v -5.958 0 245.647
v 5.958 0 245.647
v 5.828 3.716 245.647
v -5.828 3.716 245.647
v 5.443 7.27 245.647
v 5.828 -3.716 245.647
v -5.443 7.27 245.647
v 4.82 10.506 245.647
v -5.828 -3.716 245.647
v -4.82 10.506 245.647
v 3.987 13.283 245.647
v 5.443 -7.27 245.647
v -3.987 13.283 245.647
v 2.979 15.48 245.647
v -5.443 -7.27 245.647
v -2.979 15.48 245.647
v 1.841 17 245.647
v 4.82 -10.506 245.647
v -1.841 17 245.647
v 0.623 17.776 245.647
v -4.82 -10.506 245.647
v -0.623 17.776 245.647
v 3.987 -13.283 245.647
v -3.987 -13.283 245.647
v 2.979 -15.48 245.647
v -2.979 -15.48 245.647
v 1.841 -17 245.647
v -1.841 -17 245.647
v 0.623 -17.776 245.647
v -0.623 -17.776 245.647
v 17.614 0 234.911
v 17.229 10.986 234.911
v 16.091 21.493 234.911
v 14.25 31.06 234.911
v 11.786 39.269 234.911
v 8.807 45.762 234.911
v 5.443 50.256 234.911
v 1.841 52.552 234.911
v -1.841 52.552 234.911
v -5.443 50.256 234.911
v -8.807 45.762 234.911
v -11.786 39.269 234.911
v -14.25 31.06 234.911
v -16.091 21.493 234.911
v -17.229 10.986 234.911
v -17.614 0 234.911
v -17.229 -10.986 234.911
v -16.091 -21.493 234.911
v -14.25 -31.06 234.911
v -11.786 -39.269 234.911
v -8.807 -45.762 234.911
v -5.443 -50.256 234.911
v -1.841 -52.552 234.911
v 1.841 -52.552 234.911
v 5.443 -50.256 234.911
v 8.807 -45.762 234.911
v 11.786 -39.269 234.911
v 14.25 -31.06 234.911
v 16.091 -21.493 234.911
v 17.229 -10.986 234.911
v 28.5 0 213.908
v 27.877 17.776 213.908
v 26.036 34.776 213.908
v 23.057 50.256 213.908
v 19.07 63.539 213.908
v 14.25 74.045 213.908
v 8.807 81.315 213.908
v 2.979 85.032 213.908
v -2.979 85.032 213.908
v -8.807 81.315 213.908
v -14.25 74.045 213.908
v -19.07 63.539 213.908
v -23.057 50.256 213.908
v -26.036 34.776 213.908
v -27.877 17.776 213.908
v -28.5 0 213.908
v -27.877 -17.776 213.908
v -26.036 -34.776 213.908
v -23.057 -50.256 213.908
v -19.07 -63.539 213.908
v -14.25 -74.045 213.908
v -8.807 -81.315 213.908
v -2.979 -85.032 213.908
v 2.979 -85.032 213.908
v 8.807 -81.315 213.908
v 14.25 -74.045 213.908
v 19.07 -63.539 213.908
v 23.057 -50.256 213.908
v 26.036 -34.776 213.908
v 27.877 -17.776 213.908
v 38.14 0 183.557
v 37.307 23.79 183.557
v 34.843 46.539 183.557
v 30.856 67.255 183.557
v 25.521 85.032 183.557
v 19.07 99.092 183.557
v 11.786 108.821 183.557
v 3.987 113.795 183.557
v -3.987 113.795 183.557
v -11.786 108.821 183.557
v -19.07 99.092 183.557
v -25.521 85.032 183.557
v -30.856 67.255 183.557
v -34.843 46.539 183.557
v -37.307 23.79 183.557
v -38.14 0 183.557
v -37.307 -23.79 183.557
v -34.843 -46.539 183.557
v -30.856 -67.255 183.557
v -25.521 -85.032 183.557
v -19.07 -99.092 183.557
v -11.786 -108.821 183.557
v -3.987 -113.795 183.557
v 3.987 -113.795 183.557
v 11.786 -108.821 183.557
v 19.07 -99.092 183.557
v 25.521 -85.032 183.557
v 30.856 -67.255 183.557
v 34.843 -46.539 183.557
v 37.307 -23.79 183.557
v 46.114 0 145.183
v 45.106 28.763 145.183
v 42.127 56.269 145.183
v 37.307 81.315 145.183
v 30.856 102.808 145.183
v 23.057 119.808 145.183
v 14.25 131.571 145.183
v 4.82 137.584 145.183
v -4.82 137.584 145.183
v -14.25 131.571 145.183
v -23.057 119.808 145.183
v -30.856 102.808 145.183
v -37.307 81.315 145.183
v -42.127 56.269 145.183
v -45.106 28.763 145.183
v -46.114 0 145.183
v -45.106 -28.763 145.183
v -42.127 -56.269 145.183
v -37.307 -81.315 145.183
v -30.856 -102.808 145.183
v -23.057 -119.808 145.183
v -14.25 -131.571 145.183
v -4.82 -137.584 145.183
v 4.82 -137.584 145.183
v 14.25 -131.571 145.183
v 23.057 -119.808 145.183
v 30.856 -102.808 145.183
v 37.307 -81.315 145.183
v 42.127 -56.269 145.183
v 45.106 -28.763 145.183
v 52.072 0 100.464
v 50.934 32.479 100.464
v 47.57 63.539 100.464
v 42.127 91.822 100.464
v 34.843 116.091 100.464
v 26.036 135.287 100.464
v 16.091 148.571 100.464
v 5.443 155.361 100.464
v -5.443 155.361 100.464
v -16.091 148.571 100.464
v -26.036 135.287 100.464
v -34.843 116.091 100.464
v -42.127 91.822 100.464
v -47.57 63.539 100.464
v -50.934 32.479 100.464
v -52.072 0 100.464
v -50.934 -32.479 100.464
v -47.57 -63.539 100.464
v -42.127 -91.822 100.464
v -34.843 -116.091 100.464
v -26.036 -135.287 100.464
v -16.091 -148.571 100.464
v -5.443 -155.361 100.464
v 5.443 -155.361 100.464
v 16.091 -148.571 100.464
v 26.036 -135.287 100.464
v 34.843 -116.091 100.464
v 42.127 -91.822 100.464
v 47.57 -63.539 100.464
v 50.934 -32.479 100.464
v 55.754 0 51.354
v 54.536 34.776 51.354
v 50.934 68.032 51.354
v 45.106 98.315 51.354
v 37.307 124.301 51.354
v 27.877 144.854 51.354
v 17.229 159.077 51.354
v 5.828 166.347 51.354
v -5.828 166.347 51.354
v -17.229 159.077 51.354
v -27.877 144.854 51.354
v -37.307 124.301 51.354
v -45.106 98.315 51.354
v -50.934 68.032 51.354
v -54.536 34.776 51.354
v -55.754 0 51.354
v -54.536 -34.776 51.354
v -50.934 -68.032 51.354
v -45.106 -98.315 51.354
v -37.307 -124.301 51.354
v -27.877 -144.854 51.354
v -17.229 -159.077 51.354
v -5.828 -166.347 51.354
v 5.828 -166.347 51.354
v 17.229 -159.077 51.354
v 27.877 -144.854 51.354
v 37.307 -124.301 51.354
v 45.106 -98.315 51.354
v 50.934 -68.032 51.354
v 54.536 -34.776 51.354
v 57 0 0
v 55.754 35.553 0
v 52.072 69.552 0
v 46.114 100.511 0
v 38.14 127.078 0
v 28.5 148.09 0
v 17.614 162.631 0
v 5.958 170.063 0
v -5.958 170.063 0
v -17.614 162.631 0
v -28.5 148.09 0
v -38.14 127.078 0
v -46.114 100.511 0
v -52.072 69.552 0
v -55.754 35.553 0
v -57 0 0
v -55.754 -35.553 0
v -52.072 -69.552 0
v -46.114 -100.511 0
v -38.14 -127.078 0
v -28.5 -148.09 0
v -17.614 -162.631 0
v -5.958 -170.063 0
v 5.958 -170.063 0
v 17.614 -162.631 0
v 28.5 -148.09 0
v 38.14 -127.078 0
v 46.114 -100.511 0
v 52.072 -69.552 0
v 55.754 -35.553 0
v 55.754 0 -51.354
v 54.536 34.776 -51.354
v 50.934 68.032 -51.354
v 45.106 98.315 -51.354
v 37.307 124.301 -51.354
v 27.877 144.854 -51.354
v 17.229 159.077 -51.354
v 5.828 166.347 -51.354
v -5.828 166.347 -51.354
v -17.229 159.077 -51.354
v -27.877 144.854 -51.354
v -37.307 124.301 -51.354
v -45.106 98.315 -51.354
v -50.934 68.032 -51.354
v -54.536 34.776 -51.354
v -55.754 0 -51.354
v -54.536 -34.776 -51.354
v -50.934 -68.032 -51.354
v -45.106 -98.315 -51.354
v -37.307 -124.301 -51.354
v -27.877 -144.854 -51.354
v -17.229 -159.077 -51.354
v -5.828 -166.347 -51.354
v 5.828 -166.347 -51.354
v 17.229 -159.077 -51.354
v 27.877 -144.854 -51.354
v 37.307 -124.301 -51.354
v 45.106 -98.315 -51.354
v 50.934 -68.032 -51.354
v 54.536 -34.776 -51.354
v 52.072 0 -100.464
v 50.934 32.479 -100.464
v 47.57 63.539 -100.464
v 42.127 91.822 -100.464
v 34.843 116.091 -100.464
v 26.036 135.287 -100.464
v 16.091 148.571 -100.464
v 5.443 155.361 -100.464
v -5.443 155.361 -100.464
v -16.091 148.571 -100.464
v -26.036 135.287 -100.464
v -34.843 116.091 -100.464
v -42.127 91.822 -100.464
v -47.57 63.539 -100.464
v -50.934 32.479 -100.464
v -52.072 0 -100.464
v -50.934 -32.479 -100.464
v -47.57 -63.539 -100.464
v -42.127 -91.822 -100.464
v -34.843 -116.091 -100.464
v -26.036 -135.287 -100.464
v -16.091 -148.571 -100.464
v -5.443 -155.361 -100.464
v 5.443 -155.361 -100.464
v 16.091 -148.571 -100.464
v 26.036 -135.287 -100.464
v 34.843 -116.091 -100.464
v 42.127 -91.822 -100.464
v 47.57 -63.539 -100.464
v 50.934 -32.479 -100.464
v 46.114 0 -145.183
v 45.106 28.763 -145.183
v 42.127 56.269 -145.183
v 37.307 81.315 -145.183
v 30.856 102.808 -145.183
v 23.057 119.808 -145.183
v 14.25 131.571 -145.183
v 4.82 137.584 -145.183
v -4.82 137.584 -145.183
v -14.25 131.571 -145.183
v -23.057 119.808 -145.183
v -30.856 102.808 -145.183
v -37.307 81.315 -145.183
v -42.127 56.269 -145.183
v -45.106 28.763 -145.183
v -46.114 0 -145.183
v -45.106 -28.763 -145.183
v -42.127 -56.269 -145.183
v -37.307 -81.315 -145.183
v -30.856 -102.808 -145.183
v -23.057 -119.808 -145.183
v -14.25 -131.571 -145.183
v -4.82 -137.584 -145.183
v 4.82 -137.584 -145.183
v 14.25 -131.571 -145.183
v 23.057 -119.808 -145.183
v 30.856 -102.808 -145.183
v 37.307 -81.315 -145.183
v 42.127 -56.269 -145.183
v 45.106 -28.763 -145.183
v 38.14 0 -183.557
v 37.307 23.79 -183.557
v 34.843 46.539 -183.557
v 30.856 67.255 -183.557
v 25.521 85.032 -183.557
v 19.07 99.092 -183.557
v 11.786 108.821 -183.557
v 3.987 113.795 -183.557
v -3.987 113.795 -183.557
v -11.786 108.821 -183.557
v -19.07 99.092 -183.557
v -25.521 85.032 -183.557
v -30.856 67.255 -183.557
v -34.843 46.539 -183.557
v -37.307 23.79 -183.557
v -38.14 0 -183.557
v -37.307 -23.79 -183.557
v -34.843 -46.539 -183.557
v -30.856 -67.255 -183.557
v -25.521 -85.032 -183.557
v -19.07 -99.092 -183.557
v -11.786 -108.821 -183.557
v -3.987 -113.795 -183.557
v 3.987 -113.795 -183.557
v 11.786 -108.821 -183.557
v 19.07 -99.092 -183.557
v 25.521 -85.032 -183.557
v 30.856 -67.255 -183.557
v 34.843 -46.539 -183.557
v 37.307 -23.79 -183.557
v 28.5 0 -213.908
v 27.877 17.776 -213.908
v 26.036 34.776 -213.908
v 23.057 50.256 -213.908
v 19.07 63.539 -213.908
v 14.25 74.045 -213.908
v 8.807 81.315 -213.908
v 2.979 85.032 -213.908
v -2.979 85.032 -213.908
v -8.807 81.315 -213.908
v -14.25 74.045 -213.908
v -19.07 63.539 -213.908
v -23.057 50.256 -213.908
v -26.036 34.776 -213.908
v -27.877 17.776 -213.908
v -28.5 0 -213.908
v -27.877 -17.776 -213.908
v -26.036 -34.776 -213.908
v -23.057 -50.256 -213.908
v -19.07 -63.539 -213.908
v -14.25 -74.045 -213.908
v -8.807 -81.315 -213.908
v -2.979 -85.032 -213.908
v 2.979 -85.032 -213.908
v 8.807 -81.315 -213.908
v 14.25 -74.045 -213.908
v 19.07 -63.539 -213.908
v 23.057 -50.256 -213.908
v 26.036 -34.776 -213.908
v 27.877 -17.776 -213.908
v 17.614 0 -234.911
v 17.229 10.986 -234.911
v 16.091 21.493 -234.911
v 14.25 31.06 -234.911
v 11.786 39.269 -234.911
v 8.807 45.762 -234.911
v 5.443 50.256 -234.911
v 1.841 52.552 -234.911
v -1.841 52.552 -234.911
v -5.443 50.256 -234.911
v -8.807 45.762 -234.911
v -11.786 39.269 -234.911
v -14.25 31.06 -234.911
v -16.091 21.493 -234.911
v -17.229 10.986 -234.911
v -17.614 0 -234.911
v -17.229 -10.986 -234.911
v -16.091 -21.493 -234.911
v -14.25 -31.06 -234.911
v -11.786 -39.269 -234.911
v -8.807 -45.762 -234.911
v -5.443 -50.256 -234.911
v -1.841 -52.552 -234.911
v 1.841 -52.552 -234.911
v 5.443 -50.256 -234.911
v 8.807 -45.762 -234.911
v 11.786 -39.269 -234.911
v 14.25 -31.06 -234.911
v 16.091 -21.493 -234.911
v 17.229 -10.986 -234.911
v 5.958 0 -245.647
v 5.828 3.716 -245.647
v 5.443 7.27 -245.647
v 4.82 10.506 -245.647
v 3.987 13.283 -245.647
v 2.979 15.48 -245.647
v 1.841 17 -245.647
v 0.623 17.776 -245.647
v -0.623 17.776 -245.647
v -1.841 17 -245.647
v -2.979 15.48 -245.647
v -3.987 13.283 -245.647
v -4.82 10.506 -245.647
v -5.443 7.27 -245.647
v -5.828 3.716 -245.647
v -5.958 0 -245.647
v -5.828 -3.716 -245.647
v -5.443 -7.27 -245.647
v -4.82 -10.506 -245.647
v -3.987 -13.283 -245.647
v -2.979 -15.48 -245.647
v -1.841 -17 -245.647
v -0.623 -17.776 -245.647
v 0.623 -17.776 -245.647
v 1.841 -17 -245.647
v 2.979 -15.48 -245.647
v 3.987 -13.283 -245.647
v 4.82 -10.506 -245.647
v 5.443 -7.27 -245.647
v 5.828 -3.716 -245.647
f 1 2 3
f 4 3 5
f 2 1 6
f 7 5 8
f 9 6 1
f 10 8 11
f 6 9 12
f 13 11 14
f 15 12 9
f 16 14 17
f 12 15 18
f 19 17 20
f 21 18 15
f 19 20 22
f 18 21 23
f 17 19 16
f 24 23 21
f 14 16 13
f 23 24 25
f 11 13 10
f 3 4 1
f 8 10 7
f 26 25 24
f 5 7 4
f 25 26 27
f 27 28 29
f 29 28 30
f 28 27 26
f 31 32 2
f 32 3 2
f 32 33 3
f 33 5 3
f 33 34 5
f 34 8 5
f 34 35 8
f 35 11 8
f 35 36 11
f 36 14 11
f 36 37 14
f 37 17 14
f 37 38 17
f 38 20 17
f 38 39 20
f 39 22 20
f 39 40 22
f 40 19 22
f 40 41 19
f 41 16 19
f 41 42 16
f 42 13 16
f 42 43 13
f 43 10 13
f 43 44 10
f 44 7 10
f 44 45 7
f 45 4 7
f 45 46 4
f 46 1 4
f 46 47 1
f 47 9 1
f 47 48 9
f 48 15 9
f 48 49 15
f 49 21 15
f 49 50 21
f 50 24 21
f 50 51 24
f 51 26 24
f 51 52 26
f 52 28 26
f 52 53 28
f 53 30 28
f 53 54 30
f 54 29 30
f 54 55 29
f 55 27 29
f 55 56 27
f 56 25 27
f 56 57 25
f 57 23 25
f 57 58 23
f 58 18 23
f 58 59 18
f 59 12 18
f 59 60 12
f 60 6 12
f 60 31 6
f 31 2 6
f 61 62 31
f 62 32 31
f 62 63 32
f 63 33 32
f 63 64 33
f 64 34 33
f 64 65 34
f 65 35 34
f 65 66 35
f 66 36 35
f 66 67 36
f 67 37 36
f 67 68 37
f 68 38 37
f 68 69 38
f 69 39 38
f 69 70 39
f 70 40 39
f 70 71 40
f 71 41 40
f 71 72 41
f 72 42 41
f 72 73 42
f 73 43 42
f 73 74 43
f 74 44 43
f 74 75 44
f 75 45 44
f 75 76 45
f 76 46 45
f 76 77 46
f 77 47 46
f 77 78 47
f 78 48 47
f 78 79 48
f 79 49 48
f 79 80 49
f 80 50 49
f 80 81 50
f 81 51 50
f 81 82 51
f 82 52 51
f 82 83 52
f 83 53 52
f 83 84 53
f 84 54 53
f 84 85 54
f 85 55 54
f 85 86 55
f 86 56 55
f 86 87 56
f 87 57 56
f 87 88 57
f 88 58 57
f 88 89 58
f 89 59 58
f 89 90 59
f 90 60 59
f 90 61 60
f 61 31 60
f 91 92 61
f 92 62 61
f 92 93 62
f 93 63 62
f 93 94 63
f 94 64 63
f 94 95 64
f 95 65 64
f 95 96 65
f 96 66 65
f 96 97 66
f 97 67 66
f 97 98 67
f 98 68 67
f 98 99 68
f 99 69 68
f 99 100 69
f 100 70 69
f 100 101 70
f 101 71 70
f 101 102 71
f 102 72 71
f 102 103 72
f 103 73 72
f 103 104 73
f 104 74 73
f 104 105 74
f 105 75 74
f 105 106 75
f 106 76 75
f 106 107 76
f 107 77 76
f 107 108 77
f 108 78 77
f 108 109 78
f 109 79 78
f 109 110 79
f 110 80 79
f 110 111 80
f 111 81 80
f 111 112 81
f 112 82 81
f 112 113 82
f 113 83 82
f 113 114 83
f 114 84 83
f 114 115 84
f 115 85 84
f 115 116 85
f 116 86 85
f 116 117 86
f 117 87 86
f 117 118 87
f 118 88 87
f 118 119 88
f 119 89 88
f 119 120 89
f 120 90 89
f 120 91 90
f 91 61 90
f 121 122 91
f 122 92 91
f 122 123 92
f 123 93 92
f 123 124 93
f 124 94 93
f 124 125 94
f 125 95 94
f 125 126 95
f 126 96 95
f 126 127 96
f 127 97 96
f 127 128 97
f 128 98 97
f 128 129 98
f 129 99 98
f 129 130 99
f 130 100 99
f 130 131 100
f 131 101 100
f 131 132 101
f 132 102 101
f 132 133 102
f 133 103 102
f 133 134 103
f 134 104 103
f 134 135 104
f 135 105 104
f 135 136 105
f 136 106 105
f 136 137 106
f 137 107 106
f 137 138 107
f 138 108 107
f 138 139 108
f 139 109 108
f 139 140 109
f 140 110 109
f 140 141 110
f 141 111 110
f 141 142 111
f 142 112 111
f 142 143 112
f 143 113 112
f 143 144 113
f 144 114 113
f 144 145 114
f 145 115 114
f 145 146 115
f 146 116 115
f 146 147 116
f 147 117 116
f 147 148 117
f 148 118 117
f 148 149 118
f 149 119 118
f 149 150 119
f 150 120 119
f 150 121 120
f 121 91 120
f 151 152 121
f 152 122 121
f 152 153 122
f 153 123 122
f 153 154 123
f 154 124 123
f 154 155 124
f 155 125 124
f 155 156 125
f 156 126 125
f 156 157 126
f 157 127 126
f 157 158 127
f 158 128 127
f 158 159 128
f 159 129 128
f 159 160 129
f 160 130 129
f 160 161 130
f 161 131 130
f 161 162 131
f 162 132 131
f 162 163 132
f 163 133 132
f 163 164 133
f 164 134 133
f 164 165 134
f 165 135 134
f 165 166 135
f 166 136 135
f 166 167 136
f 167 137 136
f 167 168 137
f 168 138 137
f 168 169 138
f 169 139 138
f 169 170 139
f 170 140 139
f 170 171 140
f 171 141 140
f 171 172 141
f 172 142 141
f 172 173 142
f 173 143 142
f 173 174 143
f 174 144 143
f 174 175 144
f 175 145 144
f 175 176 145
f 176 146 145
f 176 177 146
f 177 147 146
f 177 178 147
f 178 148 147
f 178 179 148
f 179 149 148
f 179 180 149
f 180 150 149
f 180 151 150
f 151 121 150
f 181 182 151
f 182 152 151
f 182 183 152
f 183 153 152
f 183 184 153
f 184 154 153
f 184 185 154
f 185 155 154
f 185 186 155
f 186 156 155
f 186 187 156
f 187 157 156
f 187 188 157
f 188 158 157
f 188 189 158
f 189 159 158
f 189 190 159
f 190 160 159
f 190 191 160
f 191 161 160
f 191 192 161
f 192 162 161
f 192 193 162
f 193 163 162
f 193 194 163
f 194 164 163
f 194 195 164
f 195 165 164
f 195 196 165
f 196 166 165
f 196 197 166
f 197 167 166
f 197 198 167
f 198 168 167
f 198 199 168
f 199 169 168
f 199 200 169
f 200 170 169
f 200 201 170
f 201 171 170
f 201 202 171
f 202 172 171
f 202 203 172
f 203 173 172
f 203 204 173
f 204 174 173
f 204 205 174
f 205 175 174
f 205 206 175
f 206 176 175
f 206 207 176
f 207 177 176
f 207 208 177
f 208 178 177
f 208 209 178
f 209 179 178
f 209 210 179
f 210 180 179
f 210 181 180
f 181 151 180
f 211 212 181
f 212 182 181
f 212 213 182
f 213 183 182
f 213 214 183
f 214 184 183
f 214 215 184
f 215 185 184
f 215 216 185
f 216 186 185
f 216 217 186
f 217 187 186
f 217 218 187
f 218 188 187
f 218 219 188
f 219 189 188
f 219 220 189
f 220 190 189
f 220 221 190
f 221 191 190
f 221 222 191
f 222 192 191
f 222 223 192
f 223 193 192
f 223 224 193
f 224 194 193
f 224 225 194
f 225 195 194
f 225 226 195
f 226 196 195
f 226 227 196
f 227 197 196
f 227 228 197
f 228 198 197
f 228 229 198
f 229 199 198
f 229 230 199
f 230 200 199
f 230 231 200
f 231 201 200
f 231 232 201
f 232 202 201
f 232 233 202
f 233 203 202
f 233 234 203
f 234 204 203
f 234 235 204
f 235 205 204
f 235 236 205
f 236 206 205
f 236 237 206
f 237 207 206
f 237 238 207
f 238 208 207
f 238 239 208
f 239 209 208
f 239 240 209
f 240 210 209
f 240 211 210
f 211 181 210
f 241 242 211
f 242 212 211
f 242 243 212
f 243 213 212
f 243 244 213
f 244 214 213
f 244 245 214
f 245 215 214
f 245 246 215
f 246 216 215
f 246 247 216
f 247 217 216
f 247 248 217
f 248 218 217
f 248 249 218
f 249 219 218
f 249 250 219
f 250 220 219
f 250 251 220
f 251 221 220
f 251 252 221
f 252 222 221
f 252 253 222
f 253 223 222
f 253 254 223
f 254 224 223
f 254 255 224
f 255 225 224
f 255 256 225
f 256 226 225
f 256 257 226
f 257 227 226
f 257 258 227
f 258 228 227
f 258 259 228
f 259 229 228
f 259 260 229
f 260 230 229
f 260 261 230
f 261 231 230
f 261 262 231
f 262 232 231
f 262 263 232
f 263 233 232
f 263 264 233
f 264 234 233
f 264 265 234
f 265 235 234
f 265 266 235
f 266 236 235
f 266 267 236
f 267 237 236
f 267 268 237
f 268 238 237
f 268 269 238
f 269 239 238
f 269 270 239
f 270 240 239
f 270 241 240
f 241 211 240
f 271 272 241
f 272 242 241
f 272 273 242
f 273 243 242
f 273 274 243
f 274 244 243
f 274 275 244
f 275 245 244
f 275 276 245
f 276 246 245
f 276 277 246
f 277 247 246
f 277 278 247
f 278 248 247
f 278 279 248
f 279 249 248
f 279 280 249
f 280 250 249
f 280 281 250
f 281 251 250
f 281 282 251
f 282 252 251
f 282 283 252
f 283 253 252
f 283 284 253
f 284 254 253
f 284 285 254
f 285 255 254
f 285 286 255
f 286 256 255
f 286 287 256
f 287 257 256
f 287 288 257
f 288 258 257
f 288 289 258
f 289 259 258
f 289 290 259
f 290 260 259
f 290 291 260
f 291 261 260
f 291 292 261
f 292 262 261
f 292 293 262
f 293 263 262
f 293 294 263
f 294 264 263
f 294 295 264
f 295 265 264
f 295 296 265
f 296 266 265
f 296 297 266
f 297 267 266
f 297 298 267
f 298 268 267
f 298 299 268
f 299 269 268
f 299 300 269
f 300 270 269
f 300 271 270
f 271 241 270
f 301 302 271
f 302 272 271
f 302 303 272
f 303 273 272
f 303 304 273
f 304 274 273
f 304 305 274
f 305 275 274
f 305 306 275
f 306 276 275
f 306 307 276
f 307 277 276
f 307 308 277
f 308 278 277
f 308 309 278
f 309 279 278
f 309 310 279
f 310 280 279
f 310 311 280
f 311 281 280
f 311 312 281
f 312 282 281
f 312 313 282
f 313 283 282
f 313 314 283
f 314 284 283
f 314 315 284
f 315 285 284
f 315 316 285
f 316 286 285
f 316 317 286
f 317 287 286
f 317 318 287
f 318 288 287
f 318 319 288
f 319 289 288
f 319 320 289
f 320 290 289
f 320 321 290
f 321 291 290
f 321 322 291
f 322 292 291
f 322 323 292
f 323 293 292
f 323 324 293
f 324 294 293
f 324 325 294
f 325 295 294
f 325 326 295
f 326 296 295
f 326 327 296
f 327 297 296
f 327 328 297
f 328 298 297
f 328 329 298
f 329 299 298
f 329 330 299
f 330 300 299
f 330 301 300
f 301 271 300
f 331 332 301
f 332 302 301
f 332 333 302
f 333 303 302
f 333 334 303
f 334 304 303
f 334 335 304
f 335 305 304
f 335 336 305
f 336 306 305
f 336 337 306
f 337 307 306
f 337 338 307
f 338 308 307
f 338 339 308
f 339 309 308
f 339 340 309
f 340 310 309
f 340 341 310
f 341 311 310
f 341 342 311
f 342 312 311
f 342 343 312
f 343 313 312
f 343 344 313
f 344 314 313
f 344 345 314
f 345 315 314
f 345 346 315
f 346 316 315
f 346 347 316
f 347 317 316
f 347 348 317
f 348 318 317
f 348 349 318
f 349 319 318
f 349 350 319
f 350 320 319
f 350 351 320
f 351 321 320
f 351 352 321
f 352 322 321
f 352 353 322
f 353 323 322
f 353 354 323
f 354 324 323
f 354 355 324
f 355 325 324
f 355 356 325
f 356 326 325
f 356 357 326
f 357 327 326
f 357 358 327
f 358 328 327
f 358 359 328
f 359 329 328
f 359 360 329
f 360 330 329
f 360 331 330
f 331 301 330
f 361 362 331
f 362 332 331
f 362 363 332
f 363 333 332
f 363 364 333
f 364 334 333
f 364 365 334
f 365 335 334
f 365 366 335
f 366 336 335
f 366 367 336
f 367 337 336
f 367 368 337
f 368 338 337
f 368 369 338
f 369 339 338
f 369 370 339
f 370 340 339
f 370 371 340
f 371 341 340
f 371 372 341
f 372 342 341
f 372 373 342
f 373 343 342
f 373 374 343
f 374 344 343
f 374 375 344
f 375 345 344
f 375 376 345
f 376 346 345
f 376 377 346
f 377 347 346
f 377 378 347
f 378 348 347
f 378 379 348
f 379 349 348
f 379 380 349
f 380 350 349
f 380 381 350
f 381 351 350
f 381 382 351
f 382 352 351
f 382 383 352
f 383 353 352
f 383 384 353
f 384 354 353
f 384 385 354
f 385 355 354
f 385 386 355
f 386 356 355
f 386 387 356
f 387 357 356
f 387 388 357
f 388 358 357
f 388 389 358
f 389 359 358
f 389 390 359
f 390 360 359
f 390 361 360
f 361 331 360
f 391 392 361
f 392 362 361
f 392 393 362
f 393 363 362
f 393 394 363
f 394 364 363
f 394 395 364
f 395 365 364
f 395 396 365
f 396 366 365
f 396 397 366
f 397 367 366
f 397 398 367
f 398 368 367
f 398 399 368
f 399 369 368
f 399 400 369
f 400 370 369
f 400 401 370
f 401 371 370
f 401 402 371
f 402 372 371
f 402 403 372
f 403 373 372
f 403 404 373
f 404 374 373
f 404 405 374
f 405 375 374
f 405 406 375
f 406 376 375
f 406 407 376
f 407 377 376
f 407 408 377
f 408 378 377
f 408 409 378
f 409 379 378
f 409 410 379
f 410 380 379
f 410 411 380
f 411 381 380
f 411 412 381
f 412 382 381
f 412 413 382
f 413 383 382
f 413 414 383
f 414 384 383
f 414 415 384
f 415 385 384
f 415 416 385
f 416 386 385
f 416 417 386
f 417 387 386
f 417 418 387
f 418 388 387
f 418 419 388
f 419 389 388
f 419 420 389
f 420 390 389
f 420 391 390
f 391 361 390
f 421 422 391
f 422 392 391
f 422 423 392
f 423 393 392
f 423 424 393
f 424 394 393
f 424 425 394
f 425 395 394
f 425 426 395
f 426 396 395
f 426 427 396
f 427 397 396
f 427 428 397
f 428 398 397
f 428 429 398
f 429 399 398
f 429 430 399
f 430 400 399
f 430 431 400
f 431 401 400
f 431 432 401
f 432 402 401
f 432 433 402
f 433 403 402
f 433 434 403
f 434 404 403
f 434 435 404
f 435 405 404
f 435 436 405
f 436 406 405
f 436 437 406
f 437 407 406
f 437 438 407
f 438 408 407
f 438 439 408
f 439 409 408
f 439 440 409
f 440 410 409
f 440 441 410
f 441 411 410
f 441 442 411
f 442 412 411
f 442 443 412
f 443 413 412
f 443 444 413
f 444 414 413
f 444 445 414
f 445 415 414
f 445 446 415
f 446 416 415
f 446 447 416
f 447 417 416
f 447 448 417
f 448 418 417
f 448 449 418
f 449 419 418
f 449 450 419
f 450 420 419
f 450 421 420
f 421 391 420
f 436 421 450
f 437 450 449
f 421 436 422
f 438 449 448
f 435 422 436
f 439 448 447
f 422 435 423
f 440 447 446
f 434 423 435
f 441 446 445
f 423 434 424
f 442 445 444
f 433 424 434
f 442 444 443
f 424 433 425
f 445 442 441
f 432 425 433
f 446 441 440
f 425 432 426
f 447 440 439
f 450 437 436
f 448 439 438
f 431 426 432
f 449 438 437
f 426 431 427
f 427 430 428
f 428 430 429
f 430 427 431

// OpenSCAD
// Generated by SolidPython 1.0.1 on 2020-07-29 00:39:25


scale(v = [3, 9, 13]) {
	sphere(r = 19);
}
/***********************************************
*********      SolidPython code:      **********
************************************************
 
# import packages: SolidPython
from solid import *
from solid.utils import *
from itertools import chain, combinations


class Resize:

    def __init__(self, scad_file):
        self.scad_file = scad_file
        #self.scad_file = import_scad(scad_file)
        # cone/cylinder param:
        self.r1 = 0
        self.r2 = 0
        self.h = 0
        # rectangular prism param:
        self.w = 0
        self.l = 0
        # ellipse param:
        self.r = 0

    # import OpenScad code (file name corresponds to shape)


    # classify shape + parameters
    def assign(self, param1, param2, param3):
        if self.scad_file == 'cone.scad':
            self.r1 = param1
            self.r2 = param2
            self.h = param3
        elif self.scad_file == 'cylinder.scad':
            self.r1 = param1
            self.r2 = param2
            self.h = param3
        elif self.scad_file == 'rectangularPrism.scad':
            self.h = param1
            self.l = param2
            self.w = param3
        else:
            self.r = param1
            self.h = param2

    # resize parameters
    def iterate(self):
        x = range(3, 20, 2)
        i = 1
        if self.scad_file == 'cone.scad':
            tempList = list(combinations(x, 2))
            for temp in tempList:
                param1 = temp[0]
                param2 = temp[1]
                filepath = 'produced_scad_files/' + 'cone' + str(param1) + '_' + str(param2) + '_' + '.scad'
                scad_render_to_file(cylinder(h=param1, r1=param2, r2=0), filepath)

        elif self.scad_file == 'cylinder.scad':
            tempList = list(combinations(x, 3))
            for temp in tempList:
                param1 = temp[0]
                param2 = temp[1]
                filepath = 'produced_scad_files/' + 'cylinder' + str(param1) + '_' + str(param2) + '_' + '.scad'
                scad_render_to_file(cylinder(h=param1, r1=param2, r2=param2), filepath)

        elif self.scad_file == 'rectangularPrism.scad':
            tempList = list(combinations(x, 3))
            for temp in tempList:
                param1 = temp[0]
                param2 = temp[1]
                param3 = temp[2]
                filepath = 'produced_scad_files/' + 'rectangularPrism' + str(param1) + '_' + str(param2) + '_' + str(
                    param3) + '.scad'
                scad_render_to_file(cube(size=(param1, param2, param3)), filepath)

        elif self.scad_file == 'ellipse.scad':
            tempList = list(combinations(x, 4))
            for temp in tempList:
                param1 = temp[0]
                param2 = temp[1]
                param3 = temp[2]
                param4 = temp[3]
                filepath = 'produced_scad_files/' + 'ellipse' + str(param1) + '_' + str(param2) + '_' + str(param3) + '_' + str(param4) + '.scad'
                scad_render_to_file(scale([param1, param2, param3])(sphere(r=param4)), filepath)

    def render_to_scadfile(self):
        scad_render_to_file(scad, 'example.scad') 
 
************************************************/
